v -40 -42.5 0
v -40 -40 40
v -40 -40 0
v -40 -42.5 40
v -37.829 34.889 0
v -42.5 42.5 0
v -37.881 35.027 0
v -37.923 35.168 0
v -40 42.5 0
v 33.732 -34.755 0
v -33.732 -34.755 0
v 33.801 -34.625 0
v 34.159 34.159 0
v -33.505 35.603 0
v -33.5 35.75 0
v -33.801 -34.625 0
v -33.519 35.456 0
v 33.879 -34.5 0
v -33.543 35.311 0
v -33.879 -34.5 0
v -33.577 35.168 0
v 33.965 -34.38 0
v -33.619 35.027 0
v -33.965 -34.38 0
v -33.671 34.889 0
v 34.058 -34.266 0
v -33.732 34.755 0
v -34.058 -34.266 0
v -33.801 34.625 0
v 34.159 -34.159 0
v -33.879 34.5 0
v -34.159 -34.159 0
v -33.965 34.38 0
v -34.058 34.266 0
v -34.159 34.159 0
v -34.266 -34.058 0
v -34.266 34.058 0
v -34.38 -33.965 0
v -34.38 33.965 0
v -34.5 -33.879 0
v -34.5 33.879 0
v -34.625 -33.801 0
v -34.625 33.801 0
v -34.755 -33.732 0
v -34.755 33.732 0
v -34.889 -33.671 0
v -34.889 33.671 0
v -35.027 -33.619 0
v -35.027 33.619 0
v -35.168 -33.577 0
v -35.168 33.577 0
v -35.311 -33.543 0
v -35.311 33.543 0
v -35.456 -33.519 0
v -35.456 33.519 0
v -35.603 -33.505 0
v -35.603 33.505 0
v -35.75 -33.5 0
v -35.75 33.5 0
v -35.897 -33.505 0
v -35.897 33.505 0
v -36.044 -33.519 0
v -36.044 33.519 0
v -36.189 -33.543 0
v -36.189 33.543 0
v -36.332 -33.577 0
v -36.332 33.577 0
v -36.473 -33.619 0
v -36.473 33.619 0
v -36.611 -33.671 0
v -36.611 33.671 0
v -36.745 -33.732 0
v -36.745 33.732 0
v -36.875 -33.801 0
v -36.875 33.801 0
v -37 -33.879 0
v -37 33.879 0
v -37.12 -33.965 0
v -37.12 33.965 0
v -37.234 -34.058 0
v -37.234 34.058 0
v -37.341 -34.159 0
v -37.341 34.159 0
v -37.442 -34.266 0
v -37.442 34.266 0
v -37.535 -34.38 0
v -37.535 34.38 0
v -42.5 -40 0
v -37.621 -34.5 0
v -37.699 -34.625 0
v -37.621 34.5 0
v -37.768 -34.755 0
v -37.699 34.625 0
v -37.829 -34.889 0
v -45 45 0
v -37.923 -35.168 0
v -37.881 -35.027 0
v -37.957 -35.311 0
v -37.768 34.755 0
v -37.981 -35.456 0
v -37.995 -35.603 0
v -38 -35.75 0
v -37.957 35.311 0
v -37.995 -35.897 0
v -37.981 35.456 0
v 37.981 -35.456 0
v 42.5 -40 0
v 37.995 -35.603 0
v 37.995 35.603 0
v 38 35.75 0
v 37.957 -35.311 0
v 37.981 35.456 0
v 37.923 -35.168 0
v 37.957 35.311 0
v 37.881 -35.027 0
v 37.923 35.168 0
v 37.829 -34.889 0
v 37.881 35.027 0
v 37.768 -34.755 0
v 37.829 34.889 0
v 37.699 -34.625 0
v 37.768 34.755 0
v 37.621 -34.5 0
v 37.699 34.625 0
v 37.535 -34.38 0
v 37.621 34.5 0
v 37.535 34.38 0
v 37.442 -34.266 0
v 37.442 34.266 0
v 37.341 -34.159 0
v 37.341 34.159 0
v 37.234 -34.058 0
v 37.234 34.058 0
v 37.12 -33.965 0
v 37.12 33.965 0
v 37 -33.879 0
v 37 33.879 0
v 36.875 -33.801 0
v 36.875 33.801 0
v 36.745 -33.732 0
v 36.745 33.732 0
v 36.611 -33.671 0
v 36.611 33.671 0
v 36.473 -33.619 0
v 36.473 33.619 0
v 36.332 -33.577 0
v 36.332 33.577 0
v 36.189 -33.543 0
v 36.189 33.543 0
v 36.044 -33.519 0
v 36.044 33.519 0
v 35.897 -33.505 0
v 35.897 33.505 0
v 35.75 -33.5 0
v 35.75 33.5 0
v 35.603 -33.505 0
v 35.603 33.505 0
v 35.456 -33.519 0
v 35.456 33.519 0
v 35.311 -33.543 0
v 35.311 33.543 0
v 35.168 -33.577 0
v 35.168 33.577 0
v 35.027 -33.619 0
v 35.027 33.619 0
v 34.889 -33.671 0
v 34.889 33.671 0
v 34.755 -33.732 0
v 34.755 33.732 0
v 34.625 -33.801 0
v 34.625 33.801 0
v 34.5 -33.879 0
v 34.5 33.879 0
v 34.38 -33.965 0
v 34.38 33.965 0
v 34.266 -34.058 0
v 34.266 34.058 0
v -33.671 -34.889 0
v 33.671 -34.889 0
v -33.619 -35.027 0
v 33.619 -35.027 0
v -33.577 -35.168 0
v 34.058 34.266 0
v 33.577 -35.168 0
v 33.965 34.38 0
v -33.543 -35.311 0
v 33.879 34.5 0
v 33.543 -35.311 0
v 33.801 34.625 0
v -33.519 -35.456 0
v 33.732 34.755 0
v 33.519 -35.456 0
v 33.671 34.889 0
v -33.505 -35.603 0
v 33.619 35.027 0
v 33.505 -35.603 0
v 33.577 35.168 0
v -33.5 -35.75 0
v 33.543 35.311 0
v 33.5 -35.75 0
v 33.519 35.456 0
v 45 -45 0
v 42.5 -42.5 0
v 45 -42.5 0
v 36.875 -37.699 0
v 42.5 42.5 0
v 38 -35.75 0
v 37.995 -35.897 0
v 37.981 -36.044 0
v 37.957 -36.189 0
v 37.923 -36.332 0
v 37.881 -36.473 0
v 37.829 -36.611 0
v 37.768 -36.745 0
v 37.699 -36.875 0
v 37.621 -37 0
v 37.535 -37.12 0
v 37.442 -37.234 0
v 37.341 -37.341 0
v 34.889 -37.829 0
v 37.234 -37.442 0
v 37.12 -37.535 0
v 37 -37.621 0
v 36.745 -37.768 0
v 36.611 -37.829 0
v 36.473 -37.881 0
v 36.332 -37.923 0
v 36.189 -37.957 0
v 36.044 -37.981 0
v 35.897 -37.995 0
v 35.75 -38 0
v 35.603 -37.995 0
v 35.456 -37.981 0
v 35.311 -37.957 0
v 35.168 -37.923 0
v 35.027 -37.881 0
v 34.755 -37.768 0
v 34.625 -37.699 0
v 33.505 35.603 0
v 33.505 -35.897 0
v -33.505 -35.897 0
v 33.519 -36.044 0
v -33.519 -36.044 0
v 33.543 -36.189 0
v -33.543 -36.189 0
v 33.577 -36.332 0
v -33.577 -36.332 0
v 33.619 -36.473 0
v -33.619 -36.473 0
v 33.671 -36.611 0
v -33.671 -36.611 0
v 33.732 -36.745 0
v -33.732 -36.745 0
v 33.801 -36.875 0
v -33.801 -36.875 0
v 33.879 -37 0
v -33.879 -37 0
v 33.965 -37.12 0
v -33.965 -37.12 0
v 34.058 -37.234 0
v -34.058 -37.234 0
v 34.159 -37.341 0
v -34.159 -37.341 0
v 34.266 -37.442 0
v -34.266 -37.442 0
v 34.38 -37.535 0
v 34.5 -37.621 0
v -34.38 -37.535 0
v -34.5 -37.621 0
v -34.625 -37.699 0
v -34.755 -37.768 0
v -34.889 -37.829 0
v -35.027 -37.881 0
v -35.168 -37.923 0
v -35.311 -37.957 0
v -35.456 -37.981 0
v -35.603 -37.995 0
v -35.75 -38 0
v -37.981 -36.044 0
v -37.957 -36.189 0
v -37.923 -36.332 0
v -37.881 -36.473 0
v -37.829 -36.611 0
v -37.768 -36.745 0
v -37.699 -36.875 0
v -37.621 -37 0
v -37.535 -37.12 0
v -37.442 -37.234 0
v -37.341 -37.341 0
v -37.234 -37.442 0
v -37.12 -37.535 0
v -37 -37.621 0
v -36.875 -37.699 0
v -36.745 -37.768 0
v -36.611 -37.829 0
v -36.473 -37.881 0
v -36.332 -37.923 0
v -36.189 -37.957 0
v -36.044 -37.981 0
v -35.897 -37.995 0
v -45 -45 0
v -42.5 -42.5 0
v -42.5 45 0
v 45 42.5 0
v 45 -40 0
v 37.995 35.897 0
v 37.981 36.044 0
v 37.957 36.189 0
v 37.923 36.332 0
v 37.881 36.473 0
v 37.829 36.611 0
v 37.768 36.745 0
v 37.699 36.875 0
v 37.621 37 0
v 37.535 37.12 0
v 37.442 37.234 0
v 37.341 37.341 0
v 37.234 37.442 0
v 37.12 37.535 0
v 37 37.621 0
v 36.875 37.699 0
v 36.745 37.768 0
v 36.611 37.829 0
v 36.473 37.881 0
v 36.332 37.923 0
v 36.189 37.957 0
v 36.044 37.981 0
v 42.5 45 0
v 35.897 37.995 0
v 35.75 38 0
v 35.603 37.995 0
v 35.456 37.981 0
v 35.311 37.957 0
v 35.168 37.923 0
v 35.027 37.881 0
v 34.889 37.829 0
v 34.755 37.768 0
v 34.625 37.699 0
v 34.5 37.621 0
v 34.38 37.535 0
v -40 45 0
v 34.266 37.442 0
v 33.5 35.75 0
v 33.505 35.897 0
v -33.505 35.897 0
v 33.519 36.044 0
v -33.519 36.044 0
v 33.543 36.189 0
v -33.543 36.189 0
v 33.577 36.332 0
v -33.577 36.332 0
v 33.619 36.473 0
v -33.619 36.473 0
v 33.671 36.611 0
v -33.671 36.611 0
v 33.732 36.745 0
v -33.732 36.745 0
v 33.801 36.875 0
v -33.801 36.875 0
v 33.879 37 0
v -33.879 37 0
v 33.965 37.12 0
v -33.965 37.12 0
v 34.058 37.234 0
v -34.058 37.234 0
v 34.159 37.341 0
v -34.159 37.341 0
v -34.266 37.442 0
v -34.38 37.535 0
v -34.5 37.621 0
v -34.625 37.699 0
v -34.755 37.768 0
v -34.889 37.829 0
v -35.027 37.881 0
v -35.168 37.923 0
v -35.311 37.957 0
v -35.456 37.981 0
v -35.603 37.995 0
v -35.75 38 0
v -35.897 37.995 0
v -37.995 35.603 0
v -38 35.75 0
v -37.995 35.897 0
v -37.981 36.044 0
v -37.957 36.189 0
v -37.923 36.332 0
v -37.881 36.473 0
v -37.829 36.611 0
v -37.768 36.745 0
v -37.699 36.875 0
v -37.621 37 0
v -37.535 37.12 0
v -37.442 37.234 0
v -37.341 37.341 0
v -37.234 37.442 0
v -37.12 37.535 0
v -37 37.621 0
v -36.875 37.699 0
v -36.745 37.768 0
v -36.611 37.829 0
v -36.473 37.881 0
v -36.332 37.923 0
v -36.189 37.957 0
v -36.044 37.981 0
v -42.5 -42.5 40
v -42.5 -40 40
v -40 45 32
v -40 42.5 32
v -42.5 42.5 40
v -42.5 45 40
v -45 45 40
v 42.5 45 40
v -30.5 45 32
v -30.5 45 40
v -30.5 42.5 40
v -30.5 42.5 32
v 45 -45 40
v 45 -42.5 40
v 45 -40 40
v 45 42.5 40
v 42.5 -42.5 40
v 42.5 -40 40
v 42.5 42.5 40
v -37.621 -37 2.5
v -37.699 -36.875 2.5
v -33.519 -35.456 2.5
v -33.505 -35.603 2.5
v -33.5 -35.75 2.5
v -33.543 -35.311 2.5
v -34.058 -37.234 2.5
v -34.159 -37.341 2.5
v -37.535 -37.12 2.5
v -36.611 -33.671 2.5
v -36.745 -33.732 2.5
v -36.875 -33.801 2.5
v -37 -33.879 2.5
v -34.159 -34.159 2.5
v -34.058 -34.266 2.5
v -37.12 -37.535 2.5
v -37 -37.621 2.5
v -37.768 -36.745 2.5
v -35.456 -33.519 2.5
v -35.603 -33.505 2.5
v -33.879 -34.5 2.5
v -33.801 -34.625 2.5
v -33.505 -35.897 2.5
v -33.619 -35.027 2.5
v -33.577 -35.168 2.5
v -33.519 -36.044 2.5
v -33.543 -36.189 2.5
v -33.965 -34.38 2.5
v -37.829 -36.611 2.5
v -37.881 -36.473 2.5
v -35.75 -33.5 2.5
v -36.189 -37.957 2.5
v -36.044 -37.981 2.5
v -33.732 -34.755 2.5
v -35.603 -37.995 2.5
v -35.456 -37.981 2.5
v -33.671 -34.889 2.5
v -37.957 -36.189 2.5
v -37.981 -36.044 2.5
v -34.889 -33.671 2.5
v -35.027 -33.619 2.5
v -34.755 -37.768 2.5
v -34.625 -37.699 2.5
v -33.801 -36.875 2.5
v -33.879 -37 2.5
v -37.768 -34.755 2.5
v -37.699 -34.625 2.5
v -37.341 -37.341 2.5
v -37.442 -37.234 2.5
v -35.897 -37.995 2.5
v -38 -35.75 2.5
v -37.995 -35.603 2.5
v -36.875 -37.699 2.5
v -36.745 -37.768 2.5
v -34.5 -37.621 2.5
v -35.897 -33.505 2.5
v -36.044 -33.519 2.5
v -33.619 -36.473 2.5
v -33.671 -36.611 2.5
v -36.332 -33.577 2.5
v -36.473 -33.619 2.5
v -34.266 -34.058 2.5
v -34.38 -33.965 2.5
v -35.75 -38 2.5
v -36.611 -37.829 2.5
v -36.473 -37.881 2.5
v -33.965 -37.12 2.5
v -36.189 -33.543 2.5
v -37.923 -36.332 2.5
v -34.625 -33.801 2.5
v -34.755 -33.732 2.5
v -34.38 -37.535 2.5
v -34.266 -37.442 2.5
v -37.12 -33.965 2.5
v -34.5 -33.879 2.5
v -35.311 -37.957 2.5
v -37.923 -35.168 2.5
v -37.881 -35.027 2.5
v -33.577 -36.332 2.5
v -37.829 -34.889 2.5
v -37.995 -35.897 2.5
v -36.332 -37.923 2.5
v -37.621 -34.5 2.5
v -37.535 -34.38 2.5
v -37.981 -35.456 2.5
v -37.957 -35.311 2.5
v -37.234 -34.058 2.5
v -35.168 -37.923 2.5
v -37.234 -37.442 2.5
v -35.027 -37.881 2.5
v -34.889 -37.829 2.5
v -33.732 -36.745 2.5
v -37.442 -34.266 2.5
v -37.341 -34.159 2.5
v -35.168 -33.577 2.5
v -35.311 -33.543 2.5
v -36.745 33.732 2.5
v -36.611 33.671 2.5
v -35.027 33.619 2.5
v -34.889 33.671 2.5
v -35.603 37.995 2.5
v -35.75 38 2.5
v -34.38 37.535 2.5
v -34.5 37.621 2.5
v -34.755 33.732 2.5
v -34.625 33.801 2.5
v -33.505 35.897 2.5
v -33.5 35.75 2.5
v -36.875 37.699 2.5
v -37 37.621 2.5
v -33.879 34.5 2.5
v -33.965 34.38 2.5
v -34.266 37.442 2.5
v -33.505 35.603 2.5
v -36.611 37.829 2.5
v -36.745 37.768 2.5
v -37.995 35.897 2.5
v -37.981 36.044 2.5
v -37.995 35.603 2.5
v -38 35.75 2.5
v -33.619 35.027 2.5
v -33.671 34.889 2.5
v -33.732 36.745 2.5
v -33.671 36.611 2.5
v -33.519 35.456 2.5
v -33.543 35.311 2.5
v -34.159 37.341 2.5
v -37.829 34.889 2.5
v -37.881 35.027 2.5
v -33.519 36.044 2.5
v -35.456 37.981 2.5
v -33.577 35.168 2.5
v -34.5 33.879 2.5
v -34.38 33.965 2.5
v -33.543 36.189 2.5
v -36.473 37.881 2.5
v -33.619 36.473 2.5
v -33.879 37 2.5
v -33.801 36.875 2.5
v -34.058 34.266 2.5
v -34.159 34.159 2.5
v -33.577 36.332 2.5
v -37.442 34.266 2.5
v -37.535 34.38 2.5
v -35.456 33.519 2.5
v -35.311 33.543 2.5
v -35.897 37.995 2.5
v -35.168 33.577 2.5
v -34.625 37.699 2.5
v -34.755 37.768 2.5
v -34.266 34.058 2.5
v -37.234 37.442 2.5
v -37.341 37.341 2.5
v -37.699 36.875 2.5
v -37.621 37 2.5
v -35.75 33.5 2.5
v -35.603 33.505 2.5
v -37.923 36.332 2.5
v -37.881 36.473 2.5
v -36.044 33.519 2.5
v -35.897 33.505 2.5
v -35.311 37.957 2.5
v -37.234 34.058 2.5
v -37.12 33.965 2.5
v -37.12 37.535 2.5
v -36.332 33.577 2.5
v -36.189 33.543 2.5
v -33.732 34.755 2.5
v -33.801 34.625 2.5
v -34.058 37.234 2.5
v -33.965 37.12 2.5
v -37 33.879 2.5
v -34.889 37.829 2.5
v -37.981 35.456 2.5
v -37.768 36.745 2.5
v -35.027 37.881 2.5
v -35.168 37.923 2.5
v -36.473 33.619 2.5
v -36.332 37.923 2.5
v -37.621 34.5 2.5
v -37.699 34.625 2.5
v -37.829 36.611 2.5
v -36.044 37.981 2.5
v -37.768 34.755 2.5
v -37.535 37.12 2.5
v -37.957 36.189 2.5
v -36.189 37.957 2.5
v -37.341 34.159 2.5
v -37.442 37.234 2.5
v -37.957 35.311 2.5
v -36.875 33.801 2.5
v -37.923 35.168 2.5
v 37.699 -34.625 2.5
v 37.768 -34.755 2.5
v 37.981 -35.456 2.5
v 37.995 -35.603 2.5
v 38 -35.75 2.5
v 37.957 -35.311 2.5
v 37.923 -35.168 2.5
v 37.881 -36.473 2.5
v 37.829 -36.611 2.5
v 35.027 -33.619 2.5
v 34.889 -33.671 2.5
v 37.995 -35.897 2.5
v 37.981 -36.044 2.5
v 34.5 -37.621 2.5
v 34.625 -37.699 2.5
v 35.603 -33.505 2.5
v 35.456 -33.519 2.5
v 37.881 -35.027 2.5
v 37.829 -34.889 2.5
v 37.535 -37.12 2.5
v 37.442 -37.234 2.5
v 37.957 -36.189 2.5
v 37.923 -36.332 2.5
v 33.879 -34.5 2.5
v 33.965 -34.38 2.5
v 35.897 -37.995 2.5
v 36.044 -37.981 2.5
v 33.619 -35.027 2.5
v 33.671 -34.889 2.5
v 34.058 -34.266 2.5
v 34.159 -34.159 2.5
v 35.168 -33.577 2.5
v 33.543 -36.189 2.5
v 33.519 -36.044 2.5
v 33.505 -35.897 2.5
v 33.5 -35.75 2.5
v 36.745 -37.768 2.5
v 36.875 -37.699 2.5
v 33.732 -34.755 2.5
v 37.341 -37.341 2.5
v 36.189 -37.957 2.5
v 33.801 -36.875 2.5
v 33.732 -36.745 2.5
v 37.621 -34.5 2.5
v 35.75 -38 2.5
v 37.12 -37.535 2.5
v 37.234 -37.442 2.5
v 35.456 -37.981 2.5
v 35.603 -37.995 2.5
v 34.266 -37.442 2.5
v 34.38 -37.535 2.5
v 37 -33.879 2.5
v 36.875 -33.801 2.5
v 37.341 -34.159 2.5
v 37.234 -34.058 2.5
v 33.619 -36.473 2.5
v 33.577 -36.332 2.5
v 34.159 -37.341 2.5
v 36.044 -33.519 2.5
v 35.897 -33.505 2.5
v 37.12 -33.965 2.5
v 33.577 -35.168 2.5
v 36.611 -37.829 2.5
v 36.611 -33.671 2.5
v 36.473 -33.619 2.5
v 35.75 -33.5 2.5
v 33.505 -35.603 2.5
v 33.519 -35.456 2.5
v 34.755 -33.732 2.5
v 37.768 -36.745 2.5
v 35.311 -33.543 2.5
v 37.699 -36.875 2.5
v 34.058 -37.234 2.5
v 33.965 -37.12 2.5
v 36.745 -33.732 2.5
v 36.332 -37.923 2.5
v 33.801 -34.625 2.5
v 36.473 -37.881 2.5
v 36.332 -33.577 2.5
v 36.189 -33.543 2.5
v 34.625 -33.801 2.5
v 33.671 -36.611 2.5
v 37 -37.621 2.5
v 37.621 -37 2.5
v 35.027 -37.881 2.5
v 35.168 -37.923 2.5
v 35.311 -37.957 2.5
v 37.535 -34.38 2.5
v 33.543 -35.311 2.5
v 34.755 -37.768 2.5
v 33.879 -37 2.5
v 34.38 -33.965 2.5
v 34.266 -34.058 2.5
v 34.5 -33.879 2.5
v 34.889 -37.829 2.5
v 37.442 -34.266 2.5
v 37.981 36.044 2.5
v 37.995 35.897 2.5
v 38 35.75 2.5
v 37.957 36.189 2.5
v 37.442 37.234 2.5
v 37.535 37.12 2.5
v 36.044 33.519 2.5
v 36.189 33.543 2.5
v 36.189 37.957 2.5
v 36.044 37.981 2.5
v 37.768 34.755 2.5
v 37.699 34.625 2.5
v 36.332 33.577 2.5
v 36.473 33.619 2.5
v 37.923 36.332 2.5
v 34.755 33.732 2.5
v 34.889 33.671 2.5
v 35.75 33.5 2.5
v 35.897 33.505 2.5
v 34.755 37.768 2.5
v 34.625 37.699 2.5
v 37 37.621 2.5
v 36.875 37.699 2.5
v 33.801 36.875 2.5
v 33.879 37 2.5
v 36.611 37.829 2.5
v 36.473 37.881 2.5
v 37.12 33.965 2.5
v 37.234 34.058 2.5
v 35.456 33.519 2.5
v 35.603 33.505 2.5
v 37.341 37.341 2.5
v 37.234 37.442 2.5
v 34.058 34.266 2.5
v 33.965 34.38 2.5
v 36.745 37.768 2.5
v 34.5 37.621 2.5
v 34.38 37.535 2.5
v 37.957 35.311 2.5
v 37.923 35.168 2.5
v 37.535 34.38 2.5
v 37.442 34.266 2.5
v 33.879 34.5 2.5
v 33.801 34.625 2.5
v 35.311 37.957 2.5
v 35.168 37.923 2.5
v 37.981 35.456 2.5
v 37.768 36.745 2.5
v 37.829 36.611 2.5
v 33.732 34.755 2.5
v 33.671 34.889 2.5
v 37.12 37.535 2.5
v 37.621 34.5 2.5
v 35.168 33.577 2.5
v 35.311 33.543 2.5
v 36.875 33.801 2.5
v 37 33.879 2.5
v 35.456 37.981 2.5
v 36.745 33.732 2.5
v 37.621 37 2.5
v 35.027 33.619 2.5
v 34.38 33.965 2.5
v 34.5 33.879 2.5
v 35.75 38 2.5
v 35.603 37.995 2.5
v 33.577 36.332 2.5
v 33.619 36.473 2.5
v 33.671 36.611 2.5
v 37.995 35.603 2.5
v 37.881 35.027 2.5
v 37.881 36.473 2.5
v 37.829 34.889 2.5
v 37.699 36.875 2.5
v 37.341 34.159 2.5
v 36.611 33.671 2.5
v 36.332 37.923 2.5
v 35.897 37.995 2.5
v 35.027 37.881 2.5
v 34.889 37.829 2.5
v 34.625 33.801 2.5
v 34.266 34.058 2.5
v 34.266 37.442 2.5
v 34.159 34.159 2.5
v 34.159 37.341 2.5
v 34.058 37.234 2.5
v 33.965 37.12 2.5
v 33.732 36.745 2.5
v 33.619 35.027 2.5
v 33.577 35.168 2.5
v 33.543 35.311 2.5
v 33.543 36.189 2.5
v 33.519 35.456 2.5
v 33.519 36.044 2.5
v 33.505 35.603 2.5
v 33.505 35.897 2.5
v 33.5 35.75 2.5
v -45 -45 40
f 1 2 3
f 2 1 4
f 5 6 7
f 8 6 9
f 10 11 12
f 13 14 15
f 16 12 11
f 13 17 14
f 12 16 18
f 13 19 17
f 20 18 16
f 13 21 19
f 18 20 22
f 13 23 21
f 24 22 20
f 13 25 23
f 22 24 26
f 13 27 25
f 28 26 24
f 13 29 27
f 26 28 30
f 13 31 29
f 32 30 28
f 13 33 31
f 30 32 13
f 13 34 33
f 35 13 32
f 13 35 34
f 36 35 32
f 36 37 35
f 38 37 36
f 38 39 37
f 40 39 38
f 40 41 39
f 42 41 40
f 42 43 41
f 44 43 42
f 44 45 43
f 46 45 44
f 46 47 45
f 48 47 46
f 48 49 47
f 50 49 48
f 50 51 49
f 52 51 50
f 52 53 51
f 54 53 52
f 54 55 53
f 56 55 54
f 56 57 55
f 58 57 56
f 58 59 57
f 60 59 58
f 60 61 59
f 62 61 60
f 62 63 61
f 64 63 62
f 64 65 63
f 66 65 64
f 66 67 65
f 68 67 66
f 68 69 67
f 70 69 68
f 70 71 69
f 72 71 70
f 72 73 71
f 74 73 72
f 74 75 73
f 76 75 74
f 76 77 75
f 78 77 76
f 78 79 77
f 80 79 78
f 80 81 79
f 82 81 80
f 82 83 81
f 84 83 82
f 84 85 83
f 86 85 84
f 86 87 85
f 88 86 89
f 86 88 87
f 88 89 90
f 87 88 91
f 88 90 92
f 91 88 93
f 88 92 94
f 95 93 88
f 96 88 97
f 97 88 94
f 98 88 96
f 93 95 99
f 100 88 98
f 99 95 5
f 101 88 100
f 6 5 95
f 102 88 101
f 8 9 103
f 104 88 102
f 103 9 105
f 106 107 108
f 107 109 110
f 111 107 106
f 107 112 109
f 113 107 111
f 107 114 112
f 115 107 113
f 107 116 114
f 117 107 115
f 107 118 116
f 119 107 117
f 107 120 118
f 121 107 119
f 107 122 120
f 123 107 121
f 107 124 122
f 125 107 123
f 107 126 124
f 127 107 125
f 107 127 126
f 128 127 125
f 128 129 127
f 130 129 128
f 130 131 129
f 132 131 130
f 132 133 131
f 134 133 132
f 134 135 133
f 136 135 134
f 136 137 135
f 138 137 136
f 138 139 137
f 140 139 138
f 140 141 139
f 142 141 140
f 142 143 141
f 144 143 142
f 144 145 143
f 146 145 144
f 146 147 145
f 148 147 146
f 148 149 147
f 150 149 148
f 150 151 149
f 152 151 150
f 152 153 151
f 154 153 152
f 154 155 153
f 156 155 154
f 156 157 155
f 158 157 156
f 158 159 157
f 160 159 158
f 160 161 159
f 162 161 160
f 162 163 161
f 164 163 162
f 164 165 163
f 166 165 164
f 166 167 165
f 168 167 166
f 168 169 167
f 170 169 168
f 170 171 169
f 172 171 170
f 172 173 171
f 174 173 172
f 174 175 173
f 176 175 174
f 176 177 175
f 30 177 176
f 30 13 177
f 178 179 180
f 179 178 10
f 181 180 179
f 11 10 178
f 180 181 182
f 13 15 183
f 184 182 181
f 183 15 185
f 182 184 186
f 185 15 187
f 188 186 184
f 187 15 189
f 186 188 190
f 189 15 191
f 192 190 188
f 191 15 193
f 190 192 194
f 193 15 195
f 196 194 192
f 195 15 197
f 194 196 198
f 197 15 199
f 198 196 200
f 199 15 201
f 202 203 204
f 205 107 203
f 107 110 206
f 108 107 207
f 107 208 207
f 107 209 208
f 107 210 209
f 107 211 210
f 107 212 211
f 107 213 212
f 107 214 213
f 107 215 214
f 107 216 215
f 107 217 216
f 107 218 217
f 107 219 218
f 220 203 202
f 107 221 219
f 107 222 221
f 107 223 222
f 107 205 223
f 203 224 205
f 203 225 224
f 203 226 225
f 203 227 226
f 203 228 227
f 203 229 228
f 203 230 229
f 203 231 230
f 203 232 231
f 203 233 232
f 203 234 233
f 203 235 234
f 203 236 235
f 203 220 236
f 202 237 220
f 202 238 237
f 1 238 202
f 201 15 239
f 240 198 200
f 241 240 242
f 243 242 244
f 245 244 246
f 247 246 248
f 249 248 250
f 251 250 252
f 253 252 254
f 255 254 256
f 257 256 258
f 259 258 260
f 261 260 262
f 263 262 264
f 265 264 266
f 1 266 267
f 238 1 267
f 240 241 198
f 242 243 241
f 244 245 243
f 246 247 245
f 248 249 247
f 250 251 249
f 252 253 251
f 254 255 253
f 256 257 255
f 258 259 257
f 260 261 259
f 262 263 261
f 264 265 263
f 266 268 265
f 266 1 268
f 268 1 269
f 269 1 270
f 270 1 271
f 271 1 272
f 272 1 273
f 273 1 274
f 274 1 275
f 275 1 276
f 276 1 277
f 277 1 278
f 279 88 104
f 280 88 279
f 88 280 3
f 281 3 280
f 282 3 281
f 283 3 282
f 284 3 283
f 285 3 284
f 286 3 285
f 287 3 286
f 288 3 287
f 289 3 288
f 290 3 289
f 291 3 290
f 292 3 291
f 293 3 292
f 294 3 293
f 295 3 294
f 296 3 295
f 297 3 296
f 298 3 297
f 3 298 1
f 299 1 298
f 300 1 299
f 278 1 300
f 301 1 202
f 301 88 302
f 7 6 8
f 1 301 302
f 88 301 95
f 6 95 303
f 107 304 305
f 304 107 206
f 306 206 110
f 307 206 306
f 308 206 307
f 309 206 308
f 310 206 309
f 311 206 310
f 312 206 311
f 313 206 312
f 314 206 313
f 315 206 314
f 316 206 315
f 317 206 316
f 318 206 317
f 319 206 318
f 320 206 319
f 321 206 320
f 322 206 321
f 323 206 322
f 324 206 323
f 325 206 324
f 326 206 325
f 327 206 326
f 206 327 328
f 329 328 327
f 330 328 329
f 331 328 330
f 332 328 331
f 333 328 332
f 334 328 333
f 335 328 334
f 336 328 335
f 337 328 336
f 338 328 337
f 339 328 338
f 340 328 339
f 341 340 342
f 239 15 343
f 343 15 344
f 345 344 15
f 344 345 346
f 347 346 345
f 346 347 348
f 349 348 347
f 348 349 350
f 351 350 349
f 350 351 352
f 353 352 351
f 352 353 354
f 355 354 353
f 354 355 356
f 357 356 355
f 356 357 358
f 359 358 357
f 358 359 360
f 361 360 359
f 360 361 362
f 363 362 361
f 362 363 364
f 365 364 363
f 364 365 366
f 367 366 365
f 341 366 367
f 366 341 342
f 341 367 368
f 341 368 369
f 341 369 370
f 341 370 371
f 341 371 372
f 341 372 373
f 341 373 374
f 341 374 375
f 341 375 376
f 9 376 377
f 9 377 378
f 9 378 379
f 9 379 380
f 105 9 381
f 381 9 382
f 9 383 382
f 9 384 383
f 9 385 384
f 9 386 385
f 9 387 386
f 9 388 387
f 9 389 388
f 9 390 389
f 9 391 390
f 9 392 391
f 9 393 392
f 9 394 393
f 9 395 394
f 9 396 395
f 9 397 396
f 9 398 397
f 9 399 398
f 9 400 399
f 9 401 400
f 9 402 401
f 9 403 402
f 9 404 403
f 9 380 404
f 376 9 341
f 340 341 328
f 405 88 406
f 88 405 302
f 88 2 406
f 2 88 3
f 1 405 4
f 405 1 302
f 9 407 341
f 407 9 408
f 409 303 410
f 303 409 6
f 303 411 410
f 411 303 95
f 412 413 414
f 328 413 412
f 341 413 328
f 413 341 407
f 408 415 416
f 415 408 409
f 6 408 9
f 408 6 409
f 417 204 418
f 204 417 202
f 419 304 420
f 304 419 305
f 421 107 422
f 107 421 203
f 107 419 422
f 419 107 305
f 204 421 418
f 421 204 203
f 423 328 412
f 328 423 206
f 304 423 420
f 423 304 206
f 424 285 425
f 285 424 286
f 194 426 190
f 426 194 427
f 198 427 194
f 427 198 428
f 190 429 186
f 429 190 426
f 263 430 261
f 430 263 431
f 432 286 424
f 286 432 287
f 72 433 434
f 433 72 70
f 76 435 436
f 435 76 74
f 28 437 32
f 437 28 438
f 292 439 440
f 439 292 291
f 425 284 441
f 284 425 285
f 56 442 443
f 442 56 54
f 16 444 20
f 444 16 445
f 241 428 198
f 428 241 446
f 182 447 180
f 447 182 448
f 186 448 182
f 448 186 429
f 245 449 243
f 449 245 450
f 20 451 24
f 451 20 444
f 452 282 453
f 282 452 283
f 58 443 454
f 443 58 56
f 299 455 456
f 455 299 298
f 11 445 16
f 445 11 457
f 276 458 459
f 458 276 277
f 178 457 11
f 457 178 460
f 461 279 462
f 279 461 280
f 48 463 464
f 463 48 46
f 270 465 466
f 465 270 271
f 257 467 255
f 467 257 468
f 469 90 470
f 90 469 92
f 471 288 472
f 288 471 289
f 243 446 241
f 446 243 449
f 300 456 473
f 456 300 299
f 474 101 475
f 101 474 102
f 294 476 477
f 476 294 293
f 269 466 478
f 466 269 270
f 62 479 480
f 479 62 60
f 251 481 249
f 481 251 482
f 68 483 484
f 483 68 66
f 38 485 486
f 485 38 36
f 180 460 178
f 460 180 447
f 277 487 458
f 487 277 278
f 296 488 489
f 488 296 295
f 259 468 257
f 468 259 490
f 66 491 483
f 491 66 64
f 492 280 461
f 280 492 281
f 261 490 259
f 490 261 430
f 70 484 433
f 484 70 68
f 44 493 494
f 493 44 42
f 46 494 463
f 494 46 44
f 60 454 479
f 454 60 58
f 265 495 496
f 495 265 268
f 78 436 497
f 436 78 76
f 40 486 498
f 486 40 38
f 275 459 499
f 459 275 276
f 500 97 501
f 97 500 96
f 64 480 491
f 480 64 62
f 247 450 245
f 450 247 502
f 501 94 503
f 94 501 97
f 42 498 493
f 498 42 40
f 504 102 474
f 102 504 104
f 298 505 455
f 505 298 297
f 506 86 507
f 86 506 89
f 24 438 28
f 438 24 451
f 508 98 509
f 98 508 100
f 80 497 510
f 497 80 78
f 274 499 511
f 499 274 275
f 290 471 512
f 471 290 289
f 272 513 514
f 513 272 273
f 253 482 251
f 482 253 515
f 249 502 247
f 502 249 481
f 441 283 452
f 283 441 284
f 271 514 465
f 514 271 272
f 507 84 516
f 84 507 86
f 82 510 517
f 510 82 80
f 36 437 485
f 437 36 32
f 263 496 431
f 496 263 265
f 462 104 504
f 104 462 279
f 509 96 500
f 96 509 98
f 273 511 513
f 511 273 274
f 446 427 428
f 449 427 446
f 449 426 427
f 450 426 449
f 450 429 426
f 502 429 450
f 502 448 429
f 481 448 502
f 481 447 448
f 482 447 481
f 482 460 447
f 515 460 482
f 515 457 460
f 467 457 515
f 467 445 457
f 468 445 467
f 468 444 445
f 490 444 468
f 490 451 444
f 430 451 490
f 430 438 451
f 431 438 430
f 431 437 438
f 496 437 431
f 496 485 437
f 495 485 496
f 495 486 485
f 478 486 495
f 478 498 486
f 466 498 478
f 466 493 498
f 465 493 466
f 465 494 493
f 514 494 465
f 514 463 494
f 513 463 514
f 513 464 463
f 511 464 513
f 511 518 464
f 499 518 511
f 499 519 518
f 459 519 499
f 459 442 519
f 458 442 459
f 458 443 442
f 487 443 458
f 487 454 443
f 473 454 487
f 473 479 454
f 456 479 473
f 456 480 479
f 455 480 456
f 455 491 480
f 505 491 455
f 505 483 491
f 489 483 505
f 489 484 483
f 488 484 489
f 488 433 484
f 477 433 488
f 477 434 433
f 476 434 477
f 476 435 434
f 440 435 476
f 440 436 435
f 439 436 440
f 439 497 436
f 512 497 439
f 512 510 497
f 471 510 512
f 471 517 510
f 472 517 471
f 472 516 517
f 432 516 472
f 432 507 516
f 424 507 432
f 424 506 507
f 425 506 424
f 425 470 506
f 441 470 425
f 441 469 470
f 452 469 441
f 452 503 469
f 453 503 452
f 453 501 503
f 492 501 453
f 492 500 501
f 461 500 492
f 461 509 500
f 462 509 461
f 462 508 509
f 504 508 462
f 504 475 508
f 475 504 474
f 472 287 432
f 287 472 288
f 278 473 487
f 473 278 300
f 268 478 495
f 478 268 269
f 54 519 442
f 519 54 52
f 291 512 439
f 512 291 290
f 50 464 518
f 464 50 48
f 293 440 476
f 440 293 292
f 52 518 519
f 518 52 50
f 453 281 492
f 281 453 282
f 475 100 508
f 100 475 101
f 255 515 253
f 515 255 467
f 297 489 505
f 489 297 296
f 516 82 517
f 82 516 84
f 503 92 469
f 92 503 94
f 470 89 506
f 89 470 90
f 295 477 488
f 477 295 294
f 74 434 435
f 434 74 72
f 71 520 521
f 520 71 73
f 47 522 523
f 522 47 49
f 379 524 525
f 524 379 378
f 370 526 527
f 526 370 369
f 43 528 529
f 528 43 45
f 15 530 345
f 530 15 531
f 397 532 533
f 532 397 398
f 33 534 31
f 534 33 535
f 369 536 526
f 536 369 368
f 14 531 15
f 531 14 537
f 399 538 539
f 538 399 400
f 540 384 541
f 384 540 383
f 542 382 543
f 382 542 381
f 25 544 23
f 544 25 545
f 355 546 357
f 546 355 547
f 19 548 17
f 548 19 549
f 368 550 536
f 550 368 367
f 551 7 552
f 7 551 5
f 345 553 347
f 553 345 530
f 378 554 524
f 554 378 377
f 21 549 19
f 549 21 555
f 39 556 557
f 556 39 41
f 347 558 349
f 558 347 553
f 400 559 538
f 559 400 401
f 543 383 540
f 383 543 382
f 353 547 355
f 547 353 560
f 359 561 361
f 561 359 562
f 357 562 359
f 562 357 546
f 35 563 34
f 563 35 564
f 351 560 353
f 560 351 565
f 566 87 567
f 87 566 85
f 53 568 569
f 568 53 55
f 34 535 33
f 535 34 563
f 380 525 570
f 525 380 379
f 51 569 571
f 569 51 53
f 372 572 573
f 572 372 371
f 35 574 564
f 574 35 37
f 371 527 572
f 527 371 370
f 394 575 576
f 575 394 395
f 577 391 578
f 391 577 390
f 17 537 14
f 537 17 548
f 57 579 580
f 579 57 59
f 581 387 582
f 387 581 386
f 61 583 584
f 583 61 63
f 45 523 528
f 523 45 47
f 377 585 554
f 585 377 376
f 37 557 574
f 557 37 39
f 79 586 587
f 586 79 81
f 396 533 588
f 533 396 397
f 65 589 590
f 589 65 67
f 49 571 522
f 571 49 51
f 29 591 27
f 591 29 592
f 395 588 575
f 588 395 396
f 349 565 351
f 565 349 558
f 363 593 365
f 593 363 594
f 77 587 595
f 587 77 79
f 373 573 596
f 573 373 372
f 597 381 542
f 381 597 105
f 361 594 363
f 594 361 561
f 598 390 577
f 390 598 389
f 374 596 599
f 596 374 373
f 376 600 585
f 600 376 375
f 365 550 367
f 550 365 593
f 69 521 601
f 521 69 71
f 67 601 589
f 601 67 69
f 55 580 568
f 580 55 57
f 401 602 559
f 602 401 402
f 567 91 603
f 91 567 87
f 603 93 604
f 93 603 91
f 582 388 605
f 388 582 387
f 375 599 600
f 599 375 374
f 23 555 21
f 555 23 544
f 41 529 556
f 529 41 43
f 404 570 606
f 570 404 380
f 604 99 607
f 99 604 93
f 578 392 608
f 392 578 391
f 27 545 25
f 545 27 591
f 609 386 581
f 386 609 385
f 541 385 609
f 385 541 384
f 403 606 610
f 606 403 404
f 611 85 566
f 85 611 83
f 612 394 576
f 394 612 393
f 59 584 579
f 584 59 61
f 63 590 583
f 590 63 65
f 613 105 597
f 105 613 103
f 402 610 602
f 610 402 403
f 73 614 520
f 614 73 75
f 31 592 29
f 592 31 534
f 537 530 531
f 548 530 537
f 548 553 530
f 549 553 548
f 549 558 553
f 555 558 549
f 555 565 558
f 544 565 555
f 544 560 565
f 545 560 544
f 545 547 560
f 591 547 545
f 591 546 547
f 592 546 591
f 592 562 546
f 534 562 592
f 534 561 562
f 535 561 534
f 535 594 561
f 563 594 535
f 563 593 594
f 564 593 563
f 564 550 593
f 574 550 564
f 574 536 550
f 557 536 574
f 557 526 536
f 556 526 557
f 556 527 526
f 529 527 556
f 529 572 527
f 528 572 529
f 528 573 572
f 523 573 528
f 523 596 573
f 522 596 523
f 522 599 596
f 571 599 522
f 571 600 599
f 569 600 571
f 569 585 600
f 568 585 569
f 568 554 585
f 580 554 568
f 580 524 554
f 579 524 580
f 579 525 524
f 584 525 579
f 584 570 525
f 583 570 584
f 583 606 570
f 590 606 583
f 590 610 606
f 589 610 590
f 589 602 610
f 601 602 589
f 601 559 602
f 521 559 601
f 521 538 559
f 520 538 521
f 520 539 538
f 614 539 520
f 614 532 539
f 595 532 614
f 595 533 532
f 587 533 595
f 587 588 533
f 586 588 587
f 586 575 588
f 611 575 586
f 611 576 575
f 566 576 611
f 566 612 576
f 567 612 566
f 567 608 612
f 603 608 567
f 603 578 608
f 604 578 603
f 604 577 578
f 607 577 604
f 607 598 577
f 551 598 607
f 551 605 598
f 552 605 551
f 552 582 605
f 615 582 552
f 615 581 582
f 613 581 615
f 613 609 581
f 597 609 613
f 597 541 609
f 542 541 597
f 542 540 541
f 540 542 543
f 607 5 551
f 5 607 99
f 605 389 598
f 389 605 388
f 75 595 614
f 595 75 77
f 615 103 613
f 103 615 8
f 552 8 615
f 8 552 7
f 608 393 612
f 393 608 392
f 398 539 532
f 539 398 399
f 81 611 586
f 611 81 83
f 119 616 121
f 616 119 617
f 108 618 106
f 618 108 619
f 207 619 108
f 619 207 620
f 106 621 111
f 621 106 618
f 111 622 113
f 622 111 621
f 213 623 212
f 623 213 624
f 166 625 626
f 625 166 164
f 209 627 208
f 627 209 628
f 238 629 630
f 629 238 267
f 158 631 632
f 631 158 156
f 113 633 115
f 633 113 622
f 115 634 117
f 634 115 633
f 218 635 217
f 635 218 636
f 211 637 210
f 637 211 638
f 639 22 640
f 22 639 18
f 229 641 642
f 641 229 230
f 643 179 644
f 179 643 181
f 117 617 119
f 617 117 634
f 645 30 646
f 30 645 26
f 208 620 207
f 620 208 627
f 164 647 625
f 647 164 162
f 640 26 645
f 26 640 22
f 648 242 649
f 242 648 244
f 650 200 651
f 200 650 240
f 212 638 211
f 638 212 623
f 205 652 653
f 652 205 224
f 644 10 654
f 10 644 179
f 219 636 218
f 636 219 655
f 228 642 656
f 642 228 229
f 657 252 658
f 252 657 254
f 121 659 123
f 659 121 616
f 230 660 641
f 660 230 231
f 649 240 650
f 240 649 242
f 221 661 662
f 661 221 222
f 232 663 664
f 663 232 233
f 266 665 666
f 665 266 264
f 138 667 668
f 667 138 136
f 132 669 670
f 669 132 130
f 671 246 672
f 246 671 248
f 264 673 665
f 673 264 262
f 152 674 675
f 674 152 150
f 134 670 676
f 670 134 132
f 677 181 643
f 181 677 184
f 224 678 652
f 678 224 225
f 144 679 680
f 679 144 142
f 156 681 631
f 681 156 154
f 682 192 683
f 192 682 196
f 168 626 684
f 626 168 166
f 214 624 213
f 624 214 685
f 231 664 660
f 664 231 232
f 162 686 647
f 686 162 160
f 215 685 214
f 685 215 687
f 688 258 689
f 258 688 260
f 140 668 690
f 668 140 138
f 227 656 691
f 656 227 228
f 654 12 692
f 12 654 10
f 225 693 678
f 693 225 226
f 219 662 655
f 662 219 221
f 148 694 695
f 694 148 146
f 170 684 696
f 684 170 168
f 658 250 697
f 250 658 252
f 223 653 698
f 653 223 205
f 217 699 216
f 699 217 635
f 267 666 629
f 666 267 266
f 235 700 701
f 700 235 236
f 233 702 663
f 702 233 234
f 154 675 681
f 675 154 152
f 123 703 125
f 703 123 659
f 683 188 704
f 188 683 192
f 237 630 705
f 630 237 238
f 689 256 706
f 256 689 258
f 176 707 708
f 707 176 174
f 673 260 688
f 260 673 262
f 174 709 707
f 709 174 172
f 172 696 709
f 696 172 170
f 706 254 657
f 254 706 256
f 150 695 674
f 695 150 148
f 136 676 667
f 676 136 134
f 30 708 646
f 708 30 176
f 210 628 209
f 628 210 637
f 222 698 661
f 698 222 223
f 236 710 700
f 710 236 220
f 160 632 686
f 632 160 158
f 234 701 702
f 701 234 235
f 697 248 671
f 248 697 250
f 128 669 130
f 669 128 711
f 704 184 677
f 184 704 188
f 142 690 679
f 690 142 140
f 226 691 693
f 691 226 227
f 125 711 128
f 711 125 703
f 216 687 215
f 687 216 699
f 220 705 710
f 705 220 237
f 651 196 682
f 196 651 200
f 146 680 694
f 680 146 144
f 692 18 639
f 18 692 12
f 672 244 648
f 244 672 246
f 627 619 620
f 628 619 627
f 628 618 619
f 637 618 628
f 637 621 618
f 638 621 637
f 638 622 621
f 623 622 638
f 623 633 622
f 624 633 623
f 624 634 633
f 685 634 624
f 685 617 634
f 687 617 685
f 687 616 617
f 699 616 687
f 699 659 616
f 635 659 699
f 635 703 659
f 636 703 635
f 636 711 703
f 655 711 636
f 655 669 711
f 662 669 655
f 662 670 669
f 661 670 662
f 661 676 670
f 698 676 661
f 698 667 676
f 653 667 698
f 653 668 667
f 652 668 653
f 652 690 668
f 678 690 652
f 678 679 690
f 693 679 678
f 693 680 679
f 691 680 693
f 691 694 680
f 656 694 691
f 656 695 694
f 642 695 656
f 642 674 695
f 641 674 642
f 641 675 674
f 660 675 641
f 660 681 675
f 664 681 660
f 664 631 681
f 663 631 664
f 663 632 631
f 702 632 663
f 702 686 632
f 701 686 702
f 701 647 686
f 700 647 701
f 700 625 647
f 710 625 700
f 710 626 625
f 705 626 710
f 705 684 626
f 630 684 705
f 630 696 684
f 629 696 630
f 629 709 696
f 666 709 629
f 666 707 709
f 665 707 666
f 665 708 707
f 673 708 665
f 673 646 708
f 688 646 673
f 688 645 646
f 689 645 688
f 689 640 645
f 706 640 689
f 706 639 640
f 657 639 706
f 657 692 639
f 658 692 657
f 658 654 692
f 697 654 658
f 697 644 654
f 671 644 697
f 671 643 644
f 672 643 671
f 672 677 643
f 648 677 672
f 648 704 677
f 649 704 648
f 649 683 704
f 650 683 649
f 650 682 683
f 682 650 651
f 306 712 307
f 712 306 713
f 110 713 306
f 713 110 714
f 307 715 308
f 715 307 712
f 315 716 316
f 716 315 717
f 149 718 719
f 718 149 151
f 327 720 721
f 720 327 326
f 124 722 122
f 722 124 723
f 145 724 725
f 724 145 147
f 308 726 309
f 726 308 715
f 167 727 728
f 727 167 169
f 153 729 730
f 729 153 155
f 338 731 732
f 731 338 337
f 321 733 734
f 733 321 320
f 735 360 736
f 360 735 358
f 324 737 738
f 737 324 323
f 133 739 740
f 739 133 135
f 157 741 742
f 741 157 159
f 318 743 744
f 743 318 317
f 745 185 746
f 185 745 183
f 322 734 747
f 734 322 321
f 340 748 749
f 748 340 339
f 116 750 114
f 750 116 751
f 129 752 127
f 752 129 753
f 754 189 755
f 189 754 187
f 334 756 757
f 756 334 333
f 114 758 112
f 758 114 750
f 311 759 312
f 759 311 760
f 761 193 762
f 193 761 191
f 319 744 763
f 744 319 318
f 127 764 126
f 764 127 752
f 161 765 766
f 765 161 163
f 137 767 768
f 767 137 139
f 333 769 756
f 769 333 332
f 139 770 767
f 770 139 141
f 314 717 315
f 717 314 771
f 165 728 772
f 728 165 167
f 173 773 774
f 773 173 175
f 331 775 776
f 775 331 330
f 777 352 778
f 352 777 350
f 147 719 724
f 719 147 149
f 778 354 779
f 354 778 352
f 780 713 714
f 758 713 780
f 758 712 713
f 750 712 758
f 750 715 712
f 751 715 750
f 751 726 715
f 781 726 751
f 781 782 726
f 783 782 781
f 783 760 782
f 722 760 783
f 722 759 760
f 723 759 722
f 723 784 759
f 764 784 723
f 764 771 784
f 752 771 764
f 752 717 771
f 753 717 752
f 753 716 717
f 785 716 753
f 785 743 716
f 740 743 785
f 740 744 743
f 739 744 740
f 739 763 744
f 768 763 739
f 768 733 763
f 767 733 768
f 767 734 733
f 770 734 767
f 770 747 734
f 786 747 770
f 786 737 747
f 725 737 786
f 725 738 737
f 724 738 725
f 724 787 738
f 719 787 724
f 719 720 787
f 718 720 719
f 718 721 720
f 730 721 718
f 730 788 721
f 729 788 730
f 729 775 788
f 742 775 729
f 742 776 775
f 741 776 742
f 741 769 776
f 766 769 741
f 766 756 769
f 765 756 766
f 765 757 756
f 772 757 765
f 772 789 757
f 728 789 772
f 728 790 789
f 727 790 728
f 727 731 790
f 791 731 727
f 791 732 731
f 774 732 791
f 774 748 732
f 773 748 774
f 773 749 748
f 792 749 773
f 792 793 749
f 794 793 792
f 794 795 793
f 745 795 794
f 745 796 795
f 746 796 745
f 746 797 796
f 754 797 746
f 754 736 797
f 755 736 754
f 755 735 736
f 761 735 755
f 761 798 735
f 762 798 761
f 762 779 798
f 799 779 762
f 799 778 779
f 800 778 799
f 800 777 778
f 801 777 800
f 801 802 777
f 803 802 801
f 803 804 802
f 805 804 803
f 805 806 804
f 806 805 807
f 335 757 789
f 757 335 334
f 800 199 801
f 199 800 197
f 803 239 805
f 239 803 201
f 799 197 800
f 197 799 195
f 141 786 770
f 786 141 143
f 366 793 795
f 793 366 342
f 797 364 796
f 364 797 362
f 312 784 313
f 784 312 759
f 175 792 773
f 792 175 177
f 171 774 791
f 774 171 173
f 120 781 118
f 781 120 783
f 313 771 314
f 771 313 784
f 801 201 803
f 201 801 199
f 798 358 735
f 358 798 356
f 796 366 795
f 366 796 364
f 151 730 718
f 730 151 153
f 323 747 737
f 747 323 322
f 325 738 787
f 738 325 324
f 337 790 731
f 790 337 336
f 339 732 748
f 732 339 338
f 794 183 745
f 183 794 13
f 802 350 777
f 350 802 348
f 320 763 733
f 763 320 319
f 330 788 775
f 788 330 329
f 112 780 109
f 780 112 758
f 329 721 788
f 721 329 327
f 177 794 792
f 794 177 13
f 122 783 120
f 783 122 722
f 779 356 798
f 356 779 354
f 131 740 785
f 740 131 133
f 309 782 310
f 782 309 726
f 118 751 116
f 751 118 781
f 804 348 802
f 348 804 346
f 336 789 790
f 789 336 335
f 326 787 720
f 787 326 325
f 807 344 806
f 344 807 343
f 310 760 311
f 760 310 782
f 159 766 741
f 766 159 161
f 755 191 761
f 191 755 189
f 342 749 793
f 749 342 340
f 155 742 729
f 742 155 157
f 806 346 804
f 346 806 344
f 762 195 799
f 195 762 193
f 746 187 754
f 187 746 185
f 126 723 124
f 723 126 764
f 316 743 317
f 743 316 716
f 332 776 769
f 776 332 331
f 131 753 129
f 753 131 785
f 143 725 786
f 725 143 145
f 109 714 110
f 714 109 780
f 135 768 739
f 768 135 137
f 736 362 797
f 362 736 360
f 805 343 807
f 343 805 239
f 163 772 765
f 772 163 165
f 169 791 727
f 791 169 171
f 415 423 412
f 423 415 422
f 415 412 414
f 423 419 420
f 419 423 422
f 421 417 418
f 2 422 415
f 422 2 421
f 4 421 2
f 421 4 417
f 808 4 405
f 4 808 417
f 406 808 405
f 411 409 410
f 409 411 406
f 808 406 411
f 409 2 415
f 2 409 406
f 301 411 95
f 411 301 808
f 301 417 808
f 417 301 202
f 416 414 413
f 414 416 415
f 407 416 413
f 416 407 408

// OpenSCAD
// DIY magnetic stirrer housing for an 80 mm PC case fan
// Print orientation: upside-down open box, top plate on the bed

// ---------- Dimensions (mm) ----------
box_outer_x     = 90;    // outer length in X
box_outer_y     = 90;    // outer width in Y
top_plate_t     = 2;     // top plate thickness (z = 0 to 2)
wall_t          = 2.5;   // wall thickness (z = 2 to 40)
open_top_z      = 40;    // open top edge height
screw_hole_d    = 4.5;   // M4 screw hole diameter
screw_hole_pitch = 71.5; // square pitch of screw holes
notch_w         = 12;    // cable notch width
notch_depth     = 8;     // notch depth from open edge (z = 32 to 40)
eps             = 0.5;   // cutter overshoot past faces

$fn = 96;

// ---------- Model ----------
difference() {
    // Solid box: top plate + four walls, open at the top
    translate([-box_outer_x/2, -box_outer_y/2, 0])
        cube([box_outer_x, box_outer_y, open_top_z]);

    // Four through-cut walls, leaving the open top edge
    for (dx = [-box_outer_x/2 + wall_t, box_outer_x/2 - wall_t],
         dy = [-box_outer_y/2 + wall_t, box_outer_y/2 - wall_t])
        translate([dx, dy, 0])
            cube([wall_t, wall_t, open_top_z + eps]);

    // M4 screw holes in the top plate, centred square pattern
    for (x = [-screw_hole_pitch/2, screw_hole_pitch/2])
        for (y = [-screw_hole_pitch/2, screw_hole_pitch/2])
            translate([x, y, -eps])
                cylinder(d = screw_hole_d, h = top_plate_t + 2*eps);

    // Cable notch in one wall: centred along the wall, open to the edge
    translate([-box_outer_x/2 + wall_t, box_outer_y/2 - wall_t, open_top_z - notch_depth])
        cube([notch_w, box_outer_y/2 - wall_t, notch_depth + eps]);
}
